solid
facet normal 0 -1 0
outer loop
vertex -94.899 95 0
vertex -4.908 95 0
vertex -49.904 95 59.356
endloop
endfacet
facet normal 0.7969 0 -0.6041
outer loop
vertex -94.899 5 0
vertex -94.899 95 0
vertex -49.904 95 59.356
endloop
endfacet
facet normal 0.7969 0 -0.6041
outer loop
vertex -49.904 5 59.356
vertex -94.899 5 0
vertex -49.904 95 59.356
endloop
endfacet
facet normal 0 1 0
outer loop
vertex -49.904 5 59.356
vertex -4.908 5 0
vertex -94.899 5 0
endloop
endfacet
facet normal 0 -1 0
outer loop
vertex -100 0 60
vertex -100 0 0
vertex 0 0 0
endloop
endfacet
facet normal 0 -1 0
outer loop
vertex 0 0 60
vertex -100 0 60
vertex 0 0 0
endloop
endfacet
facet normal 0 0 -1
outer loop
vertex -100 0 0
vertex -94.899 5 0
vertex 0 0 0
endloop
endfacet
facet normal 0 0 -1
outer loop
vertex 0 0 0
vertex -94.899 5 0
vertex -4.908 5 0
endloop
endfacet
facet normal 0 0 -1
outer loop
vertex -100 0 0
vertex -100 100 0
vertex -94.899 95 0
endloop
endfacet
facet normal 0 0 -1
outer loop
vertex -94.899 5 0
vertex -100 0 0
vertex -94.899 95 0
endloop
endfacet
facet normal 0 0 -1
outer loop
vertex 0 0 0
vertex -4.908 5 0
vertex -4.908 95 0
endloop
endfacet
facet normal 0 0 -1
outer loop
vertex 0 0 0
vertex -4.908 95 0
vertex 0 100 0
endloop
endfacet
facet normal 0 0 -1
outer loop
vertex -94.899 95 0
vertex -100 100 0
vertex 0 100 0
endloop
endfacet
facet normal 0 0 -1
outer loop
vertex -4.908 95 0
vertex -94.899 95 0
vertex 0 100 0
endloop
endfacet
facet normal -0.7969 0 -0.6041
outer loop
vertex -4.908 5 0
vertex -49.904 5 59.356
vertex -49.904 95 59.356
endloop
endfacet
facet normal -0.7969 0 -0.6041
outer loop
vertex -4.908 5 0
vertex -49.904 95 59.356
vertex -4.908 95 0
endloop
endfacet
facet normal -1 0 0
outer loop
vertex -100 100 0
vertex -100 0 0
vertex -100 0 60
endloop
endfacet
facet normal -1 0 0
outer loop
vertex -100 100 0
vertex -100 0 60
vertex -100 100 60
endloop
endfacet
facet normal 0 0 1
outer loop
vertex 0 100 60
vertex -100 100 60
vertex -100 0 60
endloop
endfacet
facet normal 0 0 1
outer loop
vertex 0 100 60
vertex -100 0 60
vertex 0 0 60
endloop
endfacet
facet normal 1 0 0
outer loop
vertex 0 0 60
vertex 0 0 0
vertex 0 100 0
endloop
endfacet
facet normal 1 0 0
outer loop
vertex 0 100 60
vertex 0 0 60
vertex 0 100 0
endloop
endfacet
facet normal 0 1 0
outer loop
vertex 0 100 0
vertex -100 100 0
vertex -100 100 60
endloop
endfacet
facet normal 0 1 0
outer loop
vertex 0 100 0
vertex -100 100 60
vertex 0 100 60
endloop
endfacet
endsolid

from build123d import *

# Parameters (mm, degrees)
F0_W     = 100
F0_H     = 100
F1_DEPTH = 60
F5_DEPTH = 90


with BuildPart() as f1:
    # F0 (on Top) → F1 (new body)
    with BuildSketch(Plane.XY):
        with Locations((-50, 50)):
            Rectangle(F0_W, F0_H)
    extrude(amount=F1_DEPTH)

    # F4 (on offset) → F5 (cut)
    with BuildSketch(Plane(origin=(0, 95, 0), x_dir=(-1, 0, 0), z_dir=(0, 1, 0))):
        Polygon((49.9035641551, 59.3563504517), (4.9081675543, 0), (94.8989607559, 0), align=None)
    extrude(amount=-F5_DEPTH, mode=Mode.SUBTRACT)


solid = f1.part
